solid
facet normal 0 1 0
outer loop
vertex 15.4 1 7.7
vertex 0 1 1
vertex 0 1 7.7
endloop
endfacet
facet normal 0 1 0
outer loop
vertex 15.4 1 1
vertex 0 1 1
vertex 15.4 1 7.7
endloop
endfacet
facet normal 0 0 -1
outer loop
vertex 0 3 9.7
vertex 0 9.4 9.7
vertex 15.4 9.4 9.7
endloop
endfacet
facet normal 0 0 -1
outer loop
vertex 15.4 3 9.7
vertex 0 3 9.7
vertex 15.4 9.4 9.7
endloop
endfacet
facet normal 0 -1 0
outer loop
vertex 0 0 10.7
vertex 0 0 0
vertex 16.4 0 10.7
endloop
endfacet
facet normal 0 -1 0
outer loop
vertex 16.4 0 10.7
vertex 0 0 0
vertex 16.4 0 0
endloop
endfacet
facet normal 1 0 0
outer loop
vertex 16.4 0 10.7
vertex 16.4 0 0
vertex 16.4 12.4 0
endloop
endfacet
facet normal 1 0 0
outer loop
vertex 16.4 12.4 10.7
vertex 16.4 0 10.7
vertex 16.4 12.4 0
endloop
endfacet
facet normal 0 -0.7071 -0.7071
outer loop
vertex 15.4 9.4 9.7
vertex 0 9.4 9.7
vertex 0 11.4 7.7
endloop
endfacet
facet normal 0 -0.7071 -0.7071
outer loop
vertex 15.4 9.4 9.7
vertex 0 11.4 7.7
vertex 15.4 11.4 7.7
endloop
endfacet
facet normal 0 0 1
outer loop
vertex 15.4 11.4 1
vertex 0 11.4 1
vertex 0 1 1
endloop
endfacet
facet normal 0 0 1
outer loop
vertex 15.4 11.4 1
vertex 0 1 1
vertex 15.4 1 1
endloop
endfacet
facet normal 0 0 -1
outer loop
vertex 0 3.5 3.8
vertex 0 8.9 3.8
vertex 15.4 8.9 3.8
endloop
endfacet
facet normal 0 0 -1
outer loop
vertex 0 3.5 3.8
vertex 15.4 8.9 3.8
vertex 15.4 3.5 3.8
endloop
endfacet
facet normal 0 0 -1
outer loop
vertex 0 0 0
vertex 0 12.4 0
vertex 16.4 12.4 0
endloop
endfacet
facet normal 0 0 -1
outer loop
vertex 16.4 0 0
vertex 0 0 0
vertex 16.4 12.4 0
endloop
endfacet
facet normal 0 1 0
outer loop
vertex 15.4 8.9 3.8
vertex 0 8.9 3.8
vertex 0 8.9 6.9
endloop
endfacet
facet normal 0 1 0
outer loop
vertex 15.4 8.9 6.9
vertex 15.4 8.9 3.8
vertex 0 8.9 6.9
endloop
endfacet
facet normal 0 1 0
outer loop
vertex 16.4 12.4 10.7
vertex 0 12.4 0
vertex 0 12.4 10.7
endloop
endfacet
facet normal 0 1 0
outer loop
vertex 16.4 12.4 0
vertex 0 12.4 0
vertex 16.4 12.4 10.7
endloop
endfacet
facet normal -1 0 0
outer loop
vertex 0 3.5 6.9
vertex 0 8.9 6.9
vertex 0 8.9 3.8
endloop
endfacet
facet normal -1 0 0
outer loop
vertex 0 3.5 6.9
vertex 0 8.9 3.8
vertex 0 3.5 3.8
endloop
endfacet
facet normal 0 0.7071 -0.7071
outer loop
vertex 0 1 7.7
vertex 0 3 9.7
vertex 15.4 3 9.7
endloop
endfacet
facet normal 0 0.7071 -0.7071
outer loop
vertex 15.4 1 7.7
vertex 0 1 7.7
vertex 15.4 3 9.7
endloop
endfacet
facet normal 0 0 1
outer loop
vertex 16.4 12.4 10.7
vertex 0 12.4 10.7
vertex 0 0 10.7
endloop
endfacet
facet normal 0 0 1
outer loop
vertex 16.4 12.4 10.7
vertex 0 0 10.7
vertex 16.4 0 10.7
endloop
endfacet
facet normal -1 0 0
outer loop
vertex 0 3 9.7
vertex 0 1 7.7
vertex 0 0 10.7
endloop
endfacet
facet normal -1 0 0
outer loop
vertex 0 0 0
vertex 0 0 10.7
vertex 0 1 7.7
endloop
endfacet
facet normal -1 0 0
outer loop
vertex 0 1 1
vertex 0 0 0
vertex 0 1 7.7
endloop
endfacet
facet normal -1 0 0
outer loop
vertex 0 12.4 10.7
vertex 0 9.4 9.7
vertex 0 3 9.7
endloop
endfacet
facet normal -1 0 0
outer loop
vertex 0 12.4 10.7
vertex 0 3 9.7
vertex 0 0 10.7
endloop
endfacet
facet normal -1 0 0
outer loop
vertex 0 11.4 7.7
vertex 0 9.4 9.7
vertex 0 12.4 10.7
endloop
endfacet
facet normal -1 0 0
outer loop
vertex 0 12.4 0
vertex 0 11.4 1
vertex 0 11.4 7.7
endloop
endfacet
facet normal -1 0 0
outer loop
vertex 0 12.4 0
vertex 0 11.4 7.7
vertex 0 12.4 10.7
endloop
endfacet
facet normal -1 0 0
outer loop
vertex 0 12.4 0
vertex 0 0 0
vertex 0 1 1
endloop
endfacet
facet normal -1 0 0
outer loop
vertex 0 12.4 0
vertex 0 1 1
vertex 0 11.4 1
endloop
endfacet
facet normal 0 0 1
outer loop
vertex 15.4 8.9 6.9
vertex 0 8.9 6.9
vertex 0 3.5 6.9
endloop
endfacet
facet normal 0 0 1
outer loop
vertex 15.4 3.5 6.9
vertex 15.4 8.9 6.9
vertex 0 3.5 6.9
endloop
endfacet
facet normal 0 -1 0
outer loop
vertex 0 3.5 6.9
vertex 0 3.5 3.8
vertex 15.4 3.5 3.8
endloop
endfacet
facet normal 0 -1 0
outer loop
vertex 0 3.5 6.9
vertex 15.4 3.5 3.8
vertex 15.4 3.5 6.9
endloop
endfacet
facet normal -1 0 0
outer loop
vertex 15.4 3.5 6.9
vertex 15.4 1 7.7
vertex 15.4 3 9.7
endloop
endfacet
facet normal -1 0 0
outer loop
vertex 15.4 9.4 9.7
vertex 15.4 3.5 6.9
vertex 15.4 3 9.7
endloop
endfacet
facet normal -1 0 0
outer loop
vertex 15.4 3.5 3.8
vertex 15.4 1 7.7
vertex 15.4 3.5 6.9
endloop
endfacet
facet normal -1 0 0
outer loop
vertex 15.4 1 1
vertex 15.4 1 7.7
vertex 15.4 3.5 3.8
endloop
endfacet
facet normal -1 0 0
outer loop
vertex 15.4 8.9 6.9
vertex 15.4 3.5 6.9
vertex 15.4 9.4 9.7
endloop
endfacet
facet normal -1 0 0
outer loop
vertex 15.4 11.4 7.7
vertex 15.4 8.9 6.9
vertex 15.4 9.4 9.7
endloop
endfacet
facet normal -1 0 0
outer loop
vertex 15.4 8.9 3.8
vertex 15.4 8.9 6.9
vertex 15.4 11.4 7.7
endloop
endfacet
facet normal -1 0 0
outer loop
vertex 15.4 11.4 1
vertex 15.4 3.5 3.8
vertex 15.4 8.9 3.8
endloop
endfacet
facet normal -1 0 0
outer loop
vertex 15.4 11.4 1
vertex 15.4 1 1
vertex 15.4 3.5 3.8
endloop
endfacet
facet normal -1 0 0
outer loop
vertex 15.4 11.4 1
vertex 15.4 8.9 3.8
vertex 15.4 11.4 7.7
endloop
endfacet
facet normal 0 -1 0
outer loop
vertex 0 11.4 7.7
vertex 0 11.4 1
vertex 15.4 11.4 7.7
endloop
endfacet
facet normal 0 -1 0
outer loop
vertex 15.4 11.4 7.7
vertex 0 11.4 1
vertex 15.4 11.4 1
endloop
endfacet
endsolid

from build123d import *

# Parameters (mm, degrees)
F0_W     = 16.4
F0_H     = 12.4
F1_DEPTH = 10.7
F2_T     = -1
F3_W     = 5.4
F3_H     = 3.1
F4_DEPTH = 15.4
F5_SIZE  = 2


with BuildPart() as f1:
    # F0 (on Top) → F1 (new body)
    with BuildSketch(Plane.XY):
        with Locations((8.2, 6.2)):
            Rectangle(F0_W, F0_H)
    extrude(amount=F1_DEPTH)

    # F2
    f2_openings = [f1.faces().sort_by_distance(p)[0] for p in [
        (0, 6.2, 5.35),
    ]]
    offset(amount=F2_T, openings=f2_openings)

    # F3 (on face) → F4 (join, through all)
    with BuildSketch(Plane(origin=(0, 0, 0), x_dir=(0, -1, 0), z_dir=(-1, 0, 0))):
        with Locations((-6.2, 5.35)):
            Rectangle(F3_W, F3_H)
    extrude(amount=-F4_DEPTH)

    # F5
    f5_edges = [f1.edges().sort_by_distance(p)[0] for p in [
        (7.7, 11.4, 9.7),
        (7.7, 1, 9.7),
    ]]
    chamfer(f5_edges, length=F5_SIZE)


solid = f1.part
